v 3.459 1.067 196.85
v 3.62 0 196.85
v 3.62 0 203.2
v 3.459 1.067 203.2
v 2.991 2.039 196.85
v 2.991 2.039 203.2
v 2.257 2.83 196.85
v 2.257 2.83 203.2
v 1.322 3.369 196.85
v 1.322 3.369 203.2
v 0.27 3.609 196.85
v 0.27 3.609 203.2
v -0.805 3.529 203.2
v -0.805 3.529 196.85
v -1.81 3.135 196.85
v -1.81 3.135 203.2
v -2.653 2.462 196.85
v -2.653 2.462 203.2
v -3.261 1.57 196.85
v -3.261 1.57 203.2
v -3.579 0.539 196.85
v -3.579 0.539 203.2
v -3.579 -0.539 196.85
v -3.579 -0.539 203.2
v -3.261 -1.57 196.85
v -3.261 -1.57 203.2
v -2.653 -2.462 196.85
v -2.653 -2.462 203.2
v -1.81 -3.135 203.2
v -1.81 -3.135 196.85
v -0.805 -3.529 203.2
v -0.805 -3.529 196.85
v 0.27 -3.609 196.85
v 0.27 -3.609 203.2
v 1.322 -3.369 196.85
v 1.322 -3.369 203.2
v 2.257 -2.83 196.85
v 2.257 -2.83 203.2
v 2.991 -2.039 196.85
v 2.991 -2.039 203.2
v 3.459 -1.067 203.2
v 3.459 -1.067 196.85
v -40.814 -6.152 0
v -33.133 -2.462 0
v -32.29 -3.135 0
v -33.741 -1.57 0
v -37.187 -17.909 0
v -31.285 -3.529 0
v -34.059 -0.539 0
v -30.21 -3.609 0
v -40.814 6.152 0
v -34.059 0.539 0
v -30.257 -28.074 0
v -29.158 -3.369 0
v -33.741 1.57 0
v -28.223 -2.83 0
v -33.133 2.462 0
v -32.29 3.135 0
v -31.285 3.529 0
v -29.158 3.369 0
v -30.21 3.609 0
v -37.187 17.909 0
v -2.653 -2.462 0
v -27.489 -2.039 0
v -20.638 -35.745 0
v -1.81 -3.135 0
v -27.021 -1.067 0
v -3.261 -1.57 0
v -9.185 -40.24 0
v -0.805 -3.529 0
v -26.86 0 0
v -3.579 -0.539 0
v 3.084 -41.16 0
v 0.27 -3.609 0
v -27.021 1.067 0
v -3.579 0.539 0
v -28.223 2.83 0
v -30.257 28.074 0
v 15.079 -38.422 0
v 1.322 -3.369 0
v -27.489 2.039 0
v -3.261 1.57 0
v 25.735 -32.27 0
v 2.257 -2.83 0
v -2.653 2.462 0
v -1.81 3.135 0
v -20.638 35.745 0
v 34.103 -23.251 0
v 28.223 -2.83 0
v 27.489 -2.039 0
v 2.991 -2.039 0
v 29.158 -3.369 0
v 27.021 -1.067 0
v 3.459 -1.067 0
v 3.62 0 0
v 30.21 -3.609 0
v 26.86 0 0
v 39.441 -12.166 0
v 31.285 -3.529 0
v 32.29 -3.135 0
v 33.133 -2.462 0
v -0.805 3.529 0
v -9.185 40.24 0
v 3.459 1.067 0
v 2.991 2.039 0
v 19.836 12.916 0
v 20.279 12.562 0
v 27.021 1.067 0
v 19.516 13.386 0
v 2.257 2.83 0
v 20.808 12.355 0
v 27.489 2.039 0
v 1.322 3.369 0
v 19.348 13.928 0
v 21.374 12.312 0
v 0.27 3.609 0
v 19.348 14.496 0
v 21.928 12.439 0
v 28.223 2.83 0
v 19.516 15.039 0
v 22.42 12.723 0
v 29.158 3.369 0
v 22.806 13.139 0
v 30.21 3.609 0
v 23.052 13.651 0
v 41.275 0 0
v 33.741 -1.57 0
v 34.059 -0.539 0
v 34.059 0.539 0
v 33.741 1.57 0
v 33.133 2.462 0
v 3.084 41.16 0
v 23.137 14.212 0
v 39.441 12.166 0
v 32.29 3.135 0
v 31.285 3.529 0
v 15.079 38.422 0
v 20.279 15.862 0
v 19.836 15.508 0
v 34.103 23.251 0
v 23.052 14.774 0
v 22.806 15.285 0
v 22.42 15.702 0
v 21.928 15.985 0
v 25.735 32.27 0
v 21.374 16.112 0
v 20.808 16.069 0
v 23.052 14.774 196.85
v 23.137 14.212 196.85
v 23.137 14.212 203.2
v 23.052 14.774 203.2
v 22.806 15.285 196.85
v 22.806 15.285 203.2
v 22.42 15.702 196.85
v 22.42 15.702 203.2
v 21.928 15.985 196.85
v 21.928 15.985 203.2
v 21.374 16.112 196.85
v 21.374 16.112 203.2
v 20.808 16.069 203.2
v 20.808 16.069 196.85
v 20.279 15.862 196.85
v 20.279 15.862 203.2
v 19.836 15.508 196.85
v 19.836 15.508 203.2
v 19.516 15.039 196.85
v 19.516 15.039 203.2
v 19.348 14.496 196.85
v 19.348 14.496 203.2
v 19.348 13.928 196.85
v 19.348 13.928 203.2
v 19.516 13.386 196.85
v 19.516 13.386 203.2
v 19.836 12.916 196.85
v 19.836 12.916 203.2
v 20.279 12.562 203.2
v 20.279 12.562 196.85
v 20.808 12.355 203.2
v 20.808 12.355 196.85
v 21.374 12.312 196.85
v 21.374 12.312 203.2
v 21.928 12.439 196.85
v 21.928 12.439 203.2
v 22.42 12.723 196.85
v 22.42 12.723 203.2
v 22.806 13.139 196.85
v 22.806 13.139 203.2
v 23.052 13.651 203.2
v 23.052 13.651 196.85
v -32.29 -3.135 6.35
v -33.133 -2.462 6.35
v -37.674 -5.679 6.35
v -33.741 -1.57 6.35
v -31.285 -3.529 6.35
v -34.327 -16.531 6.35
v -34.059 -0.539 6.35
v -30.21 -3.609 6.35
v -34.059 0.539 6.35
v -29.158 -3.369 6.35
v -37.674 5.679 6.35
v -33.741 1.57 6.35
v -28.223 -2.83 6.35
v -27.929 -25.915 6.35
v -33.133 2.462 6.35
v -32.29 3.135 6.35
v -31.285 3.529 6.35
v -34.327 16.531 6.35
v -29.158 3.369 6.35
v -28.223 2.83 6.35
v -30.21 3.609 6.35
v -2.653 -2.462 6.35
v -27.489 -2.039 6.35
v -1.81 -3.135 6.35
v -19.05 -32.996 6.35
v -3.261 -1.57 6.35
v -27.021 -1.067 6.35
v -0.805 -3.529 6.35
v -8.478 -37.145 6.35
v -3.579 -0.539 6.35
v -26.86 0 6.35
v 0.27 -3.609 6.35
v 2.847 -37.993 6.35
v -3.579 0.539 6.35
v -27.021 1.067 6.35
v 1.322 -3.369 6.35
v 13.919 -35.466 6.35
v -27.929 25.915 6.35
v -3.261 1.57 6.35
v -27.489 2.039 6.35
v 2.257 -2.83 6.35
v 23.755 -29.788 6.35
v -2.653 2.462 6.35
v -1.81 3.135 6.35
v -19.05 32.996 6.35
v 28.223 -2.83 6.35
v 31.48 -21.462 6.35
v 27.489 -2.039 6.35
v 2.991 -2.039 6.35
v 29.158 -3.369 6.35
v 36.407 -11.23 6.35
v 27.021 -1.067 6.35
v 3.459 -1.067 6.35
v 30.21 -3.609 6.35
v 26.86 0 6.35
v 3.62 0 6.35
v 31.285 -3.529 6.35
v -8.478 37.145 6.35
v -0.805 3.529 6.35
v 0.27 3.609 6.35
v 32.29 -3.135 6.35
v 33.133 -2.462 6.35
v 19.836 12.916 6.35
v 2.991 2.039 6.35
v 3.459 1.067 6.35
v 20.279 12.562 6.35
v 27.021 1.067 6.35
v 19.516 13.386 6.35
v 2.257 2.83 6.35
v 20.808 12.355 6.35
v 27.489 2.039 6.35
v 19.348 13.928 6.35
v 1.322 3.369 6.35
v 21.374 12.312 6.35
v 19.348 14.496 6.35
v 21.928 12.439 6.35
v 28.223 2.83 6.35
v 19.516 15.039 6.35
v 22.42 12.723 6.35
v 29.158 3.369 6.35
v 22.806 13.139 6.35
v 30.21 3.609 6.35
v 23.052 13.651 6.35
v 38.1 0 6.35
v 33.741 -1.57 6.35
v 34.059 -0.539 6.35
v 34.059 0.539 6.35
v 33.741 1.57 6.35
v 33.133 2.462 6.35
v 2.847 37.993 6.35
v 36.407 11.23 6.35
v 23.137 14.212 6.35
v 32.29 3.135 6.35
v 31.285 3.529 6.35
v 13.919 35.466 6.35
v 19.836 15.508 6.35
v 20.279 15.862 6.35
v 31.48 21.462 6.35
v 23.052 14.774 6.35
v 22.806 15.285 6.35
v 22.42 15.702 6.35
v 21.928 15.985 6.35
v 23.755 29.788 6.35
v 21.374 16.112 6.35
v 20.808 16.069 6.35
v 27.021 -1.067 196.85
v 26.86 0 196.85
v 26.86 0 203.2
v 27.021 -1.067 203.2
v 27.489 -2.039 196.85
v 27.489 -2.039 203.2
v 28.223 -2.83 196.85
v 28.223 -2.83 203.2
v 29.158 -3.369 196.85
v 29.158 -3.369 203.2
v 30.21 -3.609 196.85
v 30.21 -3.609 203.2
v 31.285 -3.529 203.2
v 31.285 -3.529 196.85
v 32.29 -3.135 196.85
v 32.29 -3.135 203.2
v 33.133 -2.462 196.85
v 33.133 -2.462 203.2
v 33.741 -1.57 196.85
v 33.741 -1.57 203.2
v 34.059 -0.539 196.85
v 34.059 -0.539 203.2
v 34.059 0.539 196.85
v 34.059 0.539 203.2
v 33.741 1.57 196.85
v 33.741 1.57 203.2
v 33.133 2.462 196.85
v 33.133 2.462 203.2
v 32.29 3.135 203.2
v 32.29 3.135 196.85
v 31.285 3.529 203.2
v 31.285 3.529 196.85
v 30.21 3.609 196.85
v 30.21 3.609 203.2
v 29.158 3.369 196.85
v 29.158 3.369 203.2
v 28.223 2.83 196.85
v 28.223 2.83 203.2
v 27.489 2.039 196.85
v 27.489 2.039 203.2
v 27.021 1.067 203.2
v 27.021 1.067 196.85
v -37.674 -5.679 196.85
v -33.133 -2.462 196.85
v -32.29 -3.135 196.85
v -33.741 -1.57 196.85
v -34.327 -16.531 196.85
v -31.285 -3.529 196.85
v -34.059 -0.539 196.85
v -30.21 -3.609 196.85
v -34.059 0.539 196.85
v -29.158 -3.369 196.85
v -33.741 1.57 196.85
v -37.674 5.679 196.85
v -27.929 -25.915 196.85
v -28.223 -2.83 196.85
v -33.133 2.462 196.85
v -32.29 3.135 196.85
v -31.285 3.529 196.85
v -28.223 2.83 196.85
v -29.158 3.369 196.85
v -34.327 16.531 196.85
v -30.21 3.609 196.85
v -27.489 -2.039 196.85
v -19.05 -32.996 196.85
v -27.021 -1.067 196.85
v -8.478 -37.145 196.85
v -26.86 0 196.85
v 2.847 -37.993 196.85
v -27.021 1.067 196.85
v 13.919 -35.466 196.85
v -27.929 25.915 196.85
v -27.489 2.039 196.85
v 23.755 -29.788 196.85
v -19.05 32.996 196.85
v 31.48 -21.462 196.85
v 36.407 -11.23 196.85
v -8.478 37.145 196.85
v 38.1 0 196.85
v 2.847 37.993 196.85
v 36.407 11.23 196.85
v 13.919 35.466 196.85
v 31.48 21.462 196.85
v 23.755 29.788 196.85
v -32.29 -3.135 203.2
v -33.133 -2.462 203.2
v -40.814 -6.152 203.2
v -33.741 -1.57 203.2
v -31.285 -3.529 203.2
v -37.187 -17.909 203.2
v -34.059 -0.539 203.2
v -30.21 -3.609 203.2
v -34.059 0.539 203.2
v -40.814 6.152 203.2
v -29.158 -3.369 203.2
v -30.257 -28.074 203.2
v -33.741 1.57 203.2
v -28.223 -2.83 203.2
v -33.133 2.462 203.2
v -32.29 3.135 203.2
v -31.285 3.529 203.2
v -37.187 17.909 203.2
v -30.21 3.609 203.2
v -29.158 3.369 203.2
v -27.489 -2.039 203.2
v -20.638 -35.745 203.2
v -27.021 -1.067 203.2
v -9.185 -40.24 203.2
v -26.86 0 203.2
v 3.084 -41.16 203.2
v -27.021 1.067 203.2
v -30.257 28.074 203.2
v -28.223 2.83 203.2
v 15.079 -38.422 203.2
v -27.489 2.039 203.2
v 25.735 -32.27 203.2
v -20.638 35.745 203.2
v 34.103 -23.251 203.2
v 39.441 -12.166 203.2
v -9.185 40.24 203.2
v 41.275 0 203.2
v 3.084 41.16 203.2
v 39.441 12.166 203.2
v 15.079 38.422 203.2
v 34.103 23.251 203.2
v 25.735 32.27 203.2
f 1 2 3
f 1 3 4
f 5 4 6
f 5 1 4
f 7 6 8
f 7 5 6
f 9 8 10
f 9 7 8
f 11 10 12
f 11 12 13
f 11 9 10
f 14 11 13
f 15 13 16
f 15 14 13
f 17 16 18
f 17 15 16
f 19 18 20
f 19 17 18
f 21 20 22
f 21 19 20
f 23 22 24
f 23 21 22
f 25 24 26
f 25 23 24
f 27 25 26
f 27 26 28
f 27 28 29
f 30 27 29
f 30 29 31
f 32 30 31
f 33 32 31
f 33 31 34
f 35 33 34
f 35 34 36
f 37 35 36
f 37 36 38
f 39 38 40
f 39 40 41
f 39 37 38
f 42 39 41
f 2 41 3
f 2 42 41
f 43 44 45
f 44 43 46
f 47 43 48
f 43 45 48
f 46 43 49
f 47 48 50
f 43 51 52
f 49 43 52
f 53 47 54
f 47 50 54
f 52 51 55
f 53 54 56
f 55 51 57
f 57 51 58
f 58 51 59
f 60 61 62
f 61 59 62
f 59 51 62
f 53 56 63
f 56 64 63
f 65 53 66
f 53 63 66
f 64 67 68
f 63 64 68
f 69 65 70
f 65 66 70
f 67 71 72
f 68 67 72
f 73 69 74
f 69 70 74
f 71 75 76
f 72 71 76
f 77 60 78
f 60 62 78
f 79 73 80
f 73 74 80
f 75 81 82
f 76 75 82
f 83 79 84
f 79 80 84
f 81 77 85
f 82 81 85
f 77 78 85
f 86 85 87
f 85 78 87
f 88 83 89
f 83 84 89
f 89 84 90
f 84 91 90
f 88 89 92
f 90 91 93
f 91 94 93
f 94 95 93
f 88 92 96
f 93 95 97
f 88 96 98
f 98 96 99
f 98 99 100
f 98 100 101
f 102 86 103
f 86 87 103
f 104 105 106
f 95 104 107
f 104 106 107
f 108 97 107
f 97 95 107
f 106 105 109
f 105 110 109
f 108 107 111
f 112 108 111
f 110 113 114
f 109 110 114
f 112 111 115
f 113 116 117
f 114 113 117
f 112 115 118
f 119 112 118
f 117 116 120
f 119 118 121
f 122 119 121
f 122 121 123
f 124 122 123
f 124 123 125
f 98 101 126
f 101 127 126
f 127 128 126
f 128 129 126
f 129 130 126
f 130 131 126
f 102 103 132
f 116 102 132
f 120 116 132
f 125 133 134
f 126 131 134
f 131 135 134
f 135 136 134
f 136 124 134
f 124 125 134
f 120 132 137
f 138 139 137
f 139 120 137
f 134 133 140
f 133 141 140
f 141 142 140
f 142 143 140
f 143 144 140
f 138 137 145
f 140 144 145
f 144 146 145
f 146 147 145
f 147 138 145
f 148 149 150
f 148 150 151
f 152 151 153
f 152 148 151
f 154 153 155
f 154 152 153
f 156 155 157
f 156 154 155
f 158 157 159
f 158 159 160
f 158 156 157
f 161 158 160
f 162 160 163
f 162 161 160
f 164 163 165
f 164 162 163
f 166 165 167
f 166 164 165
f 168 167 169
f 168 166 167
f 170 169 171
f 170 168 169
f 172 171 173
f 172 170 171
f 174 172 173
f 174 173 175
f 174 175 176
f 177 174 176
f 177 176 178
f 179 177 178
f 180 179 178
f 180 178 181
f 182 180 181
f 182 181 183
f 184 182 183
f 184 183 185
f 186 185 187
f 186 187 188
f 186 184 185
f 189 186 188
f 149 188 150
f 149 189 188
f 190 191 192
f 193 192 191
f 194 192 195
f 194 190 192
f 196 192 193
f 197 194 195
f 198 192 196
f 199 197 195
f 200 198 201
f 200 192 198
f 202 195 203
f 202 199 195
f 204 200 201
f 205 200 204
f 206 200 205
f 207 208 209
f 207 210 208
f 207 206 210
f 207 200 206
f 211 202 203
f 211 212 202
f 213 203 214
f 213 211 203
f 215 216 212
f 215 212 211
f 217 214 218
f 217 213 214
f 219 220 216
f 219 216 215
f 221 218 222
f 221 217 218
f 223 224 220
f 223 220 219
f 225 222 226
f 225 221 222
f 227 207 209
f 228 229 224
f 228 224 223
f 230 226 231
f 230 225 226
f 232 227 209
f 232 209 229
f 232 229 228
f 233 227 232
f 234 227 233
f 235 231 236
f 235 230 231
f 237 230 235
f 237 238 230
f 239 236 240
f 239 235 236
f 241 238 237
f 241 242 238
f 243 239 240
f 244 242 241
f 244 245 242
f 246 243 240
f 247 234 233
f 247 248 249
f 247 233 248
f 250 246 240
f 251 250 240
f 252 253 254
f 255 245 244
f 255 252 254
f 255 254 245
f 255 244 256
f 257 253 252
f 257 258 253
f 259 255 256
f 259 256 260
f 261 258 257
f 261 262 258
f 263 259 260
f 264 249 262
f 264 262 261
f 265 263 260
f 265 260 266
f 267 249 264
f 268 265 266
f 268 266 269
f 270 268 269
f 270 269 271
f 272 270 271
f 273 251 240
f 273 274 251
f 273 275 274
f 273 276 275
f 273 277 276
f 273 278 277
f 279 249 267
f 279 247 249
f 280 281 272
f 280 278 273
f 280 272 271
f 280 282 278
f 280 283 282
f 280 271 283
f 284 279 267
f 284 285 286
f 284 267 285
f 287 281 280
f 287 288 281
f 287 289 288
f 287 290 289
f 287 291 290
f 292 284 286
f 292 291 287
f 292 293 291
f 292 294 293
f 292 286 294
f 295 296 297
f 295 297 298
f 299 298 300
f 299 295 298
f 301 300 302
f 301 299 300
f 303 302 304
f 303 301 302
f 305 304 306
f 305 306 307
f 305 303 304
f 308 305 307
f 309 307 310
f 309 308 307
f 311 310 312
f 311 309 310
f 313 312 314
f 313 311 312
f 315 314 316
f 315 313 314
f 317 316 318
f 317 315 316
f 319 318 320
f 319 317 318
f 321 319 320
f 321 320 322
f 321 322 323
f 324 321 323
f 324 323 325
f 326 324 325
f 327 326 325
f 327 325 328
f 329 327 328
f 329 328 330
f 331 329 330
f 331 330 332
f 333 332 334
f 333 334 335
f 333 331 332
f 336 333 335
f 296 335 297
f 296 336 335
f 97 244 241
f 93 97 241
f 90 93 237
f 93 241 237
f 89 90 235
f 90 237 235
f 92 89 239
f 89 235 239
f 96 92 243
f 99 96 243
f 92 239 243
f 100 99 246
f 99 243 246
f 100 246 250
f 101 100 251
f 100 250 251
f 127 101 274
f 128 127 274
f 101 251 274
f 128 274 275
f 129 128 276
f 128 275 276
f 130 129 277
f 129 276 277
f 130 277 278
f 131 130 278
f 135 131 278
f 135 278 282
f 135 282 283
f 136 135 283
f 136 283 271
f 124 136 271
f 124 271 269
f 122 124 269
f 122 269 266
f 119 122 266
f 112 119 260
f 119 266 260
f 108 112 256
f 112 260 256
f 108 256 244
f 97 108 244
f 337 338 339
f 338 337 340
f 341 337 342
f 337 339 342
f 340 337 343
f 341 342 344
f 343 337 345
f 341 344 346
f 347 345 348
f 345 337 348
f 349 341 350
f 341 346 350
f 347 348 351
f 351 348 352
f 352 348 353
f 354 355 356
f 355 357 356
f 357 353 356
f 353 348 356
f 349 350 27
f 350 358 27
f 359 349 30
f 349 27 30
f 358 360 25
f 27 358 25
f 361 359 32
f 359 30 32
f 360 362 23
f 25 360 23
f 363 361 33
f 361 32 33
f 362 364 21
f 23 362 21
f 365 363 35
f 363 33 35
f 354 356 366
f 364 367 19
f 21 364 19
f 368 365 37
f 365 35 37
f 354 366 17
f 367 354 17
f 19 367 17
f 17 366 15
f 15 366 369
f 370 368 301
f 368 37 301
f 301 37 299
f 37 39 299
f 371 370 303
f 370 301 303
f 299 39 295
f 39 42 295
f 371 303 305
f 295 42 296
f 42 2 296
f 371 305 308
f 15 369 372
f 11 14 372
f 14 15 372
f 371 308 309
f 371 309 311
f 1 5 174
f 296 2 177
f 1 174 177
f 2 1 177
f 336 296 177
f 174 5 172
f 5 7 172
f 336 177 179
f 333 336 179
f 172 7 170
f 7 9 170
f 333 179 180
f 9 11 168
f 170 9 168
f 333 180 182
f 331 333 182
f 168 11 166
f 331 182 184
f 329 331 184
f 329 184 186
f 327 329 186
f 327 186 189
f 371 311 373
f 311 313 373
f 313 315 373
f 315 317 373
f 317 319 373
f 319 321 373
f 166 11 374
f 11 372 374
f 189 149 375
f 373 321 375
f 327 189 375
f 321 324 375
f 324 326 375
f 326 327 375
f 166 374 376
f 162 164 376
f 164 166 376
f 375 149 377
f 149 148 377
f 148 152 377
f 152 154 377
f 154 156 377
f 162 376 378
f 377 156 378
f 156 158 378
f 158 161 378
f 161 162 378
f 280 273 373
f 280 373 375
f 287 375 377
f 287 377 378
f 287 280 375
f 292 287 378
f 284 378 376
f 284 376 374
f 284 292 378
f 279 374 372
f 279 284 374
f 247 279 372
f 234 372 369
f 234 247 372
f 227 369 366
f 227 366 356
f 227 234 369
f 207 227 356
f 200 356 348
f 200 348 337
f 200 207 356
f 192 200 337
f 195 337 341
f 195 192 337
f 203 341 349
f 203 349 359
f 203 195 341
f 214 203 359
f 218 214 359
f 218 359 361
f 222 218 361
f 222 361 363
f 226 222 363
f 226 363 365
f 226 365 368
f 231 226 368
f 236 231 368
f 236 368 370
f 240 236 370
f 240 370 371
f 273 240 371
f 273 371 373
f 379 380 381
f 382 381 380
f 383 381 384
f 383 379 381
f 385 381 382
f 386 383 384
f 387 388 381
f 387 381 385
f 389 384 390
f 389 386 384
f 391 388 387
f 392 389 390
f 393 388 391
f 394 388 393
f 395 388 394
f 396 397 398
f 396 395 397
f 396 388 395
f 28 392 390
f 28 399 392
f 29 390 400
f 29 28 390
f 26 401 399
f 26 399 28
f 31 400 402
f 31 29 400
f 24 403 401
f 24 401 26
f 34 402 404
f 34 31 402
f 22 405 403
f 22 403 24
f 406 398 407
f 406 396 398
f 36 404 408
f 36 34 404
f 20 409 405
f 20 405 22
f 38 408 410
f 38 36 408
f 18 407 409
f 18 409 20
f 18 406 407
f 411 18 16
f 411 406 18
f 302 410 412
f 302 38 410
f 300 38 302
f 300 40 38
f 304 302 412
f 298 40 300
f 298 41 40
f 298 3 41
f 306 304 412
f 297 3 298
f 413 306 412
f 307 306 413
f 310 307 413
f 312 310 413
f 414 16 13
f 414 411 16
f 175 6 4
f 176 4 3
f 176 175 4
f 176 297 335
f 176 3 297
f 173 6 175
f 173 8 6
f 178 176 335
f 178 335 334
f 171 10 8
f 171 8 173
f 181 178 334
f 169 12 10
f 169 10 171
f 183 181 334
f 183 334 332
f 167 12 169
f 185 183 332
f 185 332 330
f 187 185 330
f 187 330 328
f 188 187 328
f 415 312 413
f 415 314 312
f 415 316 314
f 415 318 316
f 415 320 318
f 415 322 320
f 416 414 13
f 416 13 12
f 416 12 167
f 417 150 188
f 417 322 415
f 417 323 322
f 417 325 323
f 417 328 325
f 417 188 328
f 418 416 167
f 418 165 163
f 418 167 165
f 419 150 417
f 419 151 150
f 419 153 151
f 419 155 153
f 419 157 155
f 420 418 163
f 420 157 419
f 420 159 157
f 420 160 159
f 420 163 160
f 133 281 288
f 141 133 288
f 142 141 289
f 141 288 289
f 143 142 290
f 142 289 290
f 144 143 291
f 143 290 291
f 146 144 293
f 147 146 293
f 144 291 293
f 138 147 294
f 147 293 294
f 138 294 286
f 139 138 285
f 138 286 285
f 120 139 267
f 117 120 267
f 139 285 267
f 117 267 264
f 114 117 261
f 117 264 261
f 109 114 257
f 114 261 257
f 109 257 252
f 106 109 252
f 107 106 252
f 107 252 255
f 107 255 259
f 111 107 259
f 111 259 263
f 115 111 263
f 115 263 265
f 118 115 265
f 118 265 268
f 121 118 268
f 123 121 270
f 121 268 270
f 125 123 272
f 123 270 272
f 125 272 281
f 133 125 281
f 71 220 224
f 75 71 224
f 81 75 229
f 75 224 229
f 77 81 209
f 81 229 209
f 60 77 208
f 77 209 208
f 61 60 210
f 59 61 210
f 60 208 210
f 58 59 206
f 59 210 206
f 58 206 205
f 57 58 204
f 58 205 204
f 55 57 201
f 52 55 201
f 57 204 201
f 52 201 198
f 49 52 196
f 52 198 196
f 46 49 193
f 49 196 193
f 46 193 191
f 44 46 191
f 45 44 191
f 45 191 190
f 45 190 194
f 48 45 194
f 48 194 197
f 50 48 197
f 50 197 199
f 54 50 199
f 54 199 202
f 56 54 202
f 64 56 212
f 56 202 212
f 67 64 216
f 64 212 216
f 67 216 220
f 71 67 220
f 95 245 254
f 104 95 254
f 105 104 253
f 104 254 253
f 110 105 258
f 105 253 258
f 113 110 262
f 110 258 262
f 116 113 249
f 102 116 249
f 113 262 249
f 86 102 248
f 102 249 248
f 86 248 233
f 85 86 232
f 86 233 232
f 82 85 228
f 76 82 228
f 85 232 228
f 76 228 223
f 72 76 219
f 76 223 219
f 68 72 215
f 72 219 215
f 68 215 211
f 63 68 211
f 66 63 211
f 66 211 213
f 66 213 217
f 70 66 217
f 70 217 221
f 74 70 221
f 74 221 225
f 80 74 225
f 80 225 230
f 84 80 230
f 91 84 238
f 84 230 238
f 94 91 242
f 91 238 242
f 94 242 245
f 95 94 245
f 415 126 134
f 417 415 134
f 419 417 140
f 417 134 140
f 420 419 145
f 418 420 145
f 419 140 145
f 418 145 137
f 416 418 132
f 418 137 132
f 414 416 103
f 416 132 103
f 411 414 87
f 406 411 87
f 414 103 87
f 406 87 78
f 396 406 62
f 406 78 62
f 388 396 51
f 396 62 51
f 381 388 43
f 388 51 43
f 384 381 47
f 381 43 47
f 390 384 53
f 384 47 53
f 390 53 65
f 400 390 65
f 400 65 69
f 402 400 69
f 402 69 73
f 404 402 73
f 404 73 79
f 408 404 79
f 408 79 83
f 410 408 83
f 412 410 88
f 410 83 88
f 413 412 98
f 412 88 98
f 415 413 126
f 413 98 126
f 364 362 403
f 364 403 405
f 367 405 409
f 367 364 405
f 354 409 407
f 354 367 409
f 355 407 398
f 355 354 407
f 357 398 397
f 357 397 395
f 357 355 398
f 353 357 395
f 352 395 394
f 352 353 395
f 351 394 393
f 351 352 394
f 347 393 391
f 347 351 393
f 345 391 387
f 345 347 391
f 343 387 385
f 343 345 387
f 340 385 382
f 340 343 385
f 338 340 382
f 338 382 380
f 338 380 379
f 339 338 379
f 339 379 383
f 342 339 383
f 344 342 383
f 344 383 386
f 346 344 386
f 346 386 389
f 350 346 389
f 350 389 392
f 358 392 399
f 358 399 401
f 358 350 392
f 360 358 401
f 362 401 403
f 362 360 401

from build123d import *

# Parameters (mm, degrees)
E_BAY_SHELL_R       = 41.275
E_BAY_SHELL_R_2     = 38.1
BOSS_EXTRUDE1_DEPTH = 203.2
LID_TOP_START       = -6.35
SKETCH2_R           = 38.1
SKETCH2_R_2         = 3.6195
SKETCH2_R_3         = 1.905
LID_TOP_DEPTH       = 6.35


with BuildPart() as part:
    # e-bay Shell → Boss-Extrude1 (new body)
    with BuildSketch(Plane.XY):
        Circle(E_BAY_SHELL_R)
        Circle(E_BAY_SHELL_R_2, mode=Mode.SUBTRACT)
    extrude(amount=BOSS_EXTRUDE1_DEPTH)

    # Sketch2 → lid-top (add)
    with BuildSketch(Plane.XY.offset(203.2).offset(LID_TOP_START)):
        Circle(SKETCH2_R)
        Circle(SKETCH2_R_2, mode=Mode.SUBTRACT)
        with Locations((-30.48, 0)):
            Circle(SKETCH2_R_2, mode=Mode.SUBTRACT)
        with Locations((21.231989214, 14.212140166)):
            Circle(SKETCH2_R_3, mode=Mode.SUBTRACT)
        with Locations(Location((30.48, 0, 0), (0, 0, 180))):
            Circle(SKETCH2_R_2, mode=Mode.SUBTRACT)
    lid_top = extrude(amount=LID_TOP_DEPTH)

    # Mirror3: lid-top across plane
    add(lid_top.mirror(Plane.XY.offset(101.6)))


solid = part.part
